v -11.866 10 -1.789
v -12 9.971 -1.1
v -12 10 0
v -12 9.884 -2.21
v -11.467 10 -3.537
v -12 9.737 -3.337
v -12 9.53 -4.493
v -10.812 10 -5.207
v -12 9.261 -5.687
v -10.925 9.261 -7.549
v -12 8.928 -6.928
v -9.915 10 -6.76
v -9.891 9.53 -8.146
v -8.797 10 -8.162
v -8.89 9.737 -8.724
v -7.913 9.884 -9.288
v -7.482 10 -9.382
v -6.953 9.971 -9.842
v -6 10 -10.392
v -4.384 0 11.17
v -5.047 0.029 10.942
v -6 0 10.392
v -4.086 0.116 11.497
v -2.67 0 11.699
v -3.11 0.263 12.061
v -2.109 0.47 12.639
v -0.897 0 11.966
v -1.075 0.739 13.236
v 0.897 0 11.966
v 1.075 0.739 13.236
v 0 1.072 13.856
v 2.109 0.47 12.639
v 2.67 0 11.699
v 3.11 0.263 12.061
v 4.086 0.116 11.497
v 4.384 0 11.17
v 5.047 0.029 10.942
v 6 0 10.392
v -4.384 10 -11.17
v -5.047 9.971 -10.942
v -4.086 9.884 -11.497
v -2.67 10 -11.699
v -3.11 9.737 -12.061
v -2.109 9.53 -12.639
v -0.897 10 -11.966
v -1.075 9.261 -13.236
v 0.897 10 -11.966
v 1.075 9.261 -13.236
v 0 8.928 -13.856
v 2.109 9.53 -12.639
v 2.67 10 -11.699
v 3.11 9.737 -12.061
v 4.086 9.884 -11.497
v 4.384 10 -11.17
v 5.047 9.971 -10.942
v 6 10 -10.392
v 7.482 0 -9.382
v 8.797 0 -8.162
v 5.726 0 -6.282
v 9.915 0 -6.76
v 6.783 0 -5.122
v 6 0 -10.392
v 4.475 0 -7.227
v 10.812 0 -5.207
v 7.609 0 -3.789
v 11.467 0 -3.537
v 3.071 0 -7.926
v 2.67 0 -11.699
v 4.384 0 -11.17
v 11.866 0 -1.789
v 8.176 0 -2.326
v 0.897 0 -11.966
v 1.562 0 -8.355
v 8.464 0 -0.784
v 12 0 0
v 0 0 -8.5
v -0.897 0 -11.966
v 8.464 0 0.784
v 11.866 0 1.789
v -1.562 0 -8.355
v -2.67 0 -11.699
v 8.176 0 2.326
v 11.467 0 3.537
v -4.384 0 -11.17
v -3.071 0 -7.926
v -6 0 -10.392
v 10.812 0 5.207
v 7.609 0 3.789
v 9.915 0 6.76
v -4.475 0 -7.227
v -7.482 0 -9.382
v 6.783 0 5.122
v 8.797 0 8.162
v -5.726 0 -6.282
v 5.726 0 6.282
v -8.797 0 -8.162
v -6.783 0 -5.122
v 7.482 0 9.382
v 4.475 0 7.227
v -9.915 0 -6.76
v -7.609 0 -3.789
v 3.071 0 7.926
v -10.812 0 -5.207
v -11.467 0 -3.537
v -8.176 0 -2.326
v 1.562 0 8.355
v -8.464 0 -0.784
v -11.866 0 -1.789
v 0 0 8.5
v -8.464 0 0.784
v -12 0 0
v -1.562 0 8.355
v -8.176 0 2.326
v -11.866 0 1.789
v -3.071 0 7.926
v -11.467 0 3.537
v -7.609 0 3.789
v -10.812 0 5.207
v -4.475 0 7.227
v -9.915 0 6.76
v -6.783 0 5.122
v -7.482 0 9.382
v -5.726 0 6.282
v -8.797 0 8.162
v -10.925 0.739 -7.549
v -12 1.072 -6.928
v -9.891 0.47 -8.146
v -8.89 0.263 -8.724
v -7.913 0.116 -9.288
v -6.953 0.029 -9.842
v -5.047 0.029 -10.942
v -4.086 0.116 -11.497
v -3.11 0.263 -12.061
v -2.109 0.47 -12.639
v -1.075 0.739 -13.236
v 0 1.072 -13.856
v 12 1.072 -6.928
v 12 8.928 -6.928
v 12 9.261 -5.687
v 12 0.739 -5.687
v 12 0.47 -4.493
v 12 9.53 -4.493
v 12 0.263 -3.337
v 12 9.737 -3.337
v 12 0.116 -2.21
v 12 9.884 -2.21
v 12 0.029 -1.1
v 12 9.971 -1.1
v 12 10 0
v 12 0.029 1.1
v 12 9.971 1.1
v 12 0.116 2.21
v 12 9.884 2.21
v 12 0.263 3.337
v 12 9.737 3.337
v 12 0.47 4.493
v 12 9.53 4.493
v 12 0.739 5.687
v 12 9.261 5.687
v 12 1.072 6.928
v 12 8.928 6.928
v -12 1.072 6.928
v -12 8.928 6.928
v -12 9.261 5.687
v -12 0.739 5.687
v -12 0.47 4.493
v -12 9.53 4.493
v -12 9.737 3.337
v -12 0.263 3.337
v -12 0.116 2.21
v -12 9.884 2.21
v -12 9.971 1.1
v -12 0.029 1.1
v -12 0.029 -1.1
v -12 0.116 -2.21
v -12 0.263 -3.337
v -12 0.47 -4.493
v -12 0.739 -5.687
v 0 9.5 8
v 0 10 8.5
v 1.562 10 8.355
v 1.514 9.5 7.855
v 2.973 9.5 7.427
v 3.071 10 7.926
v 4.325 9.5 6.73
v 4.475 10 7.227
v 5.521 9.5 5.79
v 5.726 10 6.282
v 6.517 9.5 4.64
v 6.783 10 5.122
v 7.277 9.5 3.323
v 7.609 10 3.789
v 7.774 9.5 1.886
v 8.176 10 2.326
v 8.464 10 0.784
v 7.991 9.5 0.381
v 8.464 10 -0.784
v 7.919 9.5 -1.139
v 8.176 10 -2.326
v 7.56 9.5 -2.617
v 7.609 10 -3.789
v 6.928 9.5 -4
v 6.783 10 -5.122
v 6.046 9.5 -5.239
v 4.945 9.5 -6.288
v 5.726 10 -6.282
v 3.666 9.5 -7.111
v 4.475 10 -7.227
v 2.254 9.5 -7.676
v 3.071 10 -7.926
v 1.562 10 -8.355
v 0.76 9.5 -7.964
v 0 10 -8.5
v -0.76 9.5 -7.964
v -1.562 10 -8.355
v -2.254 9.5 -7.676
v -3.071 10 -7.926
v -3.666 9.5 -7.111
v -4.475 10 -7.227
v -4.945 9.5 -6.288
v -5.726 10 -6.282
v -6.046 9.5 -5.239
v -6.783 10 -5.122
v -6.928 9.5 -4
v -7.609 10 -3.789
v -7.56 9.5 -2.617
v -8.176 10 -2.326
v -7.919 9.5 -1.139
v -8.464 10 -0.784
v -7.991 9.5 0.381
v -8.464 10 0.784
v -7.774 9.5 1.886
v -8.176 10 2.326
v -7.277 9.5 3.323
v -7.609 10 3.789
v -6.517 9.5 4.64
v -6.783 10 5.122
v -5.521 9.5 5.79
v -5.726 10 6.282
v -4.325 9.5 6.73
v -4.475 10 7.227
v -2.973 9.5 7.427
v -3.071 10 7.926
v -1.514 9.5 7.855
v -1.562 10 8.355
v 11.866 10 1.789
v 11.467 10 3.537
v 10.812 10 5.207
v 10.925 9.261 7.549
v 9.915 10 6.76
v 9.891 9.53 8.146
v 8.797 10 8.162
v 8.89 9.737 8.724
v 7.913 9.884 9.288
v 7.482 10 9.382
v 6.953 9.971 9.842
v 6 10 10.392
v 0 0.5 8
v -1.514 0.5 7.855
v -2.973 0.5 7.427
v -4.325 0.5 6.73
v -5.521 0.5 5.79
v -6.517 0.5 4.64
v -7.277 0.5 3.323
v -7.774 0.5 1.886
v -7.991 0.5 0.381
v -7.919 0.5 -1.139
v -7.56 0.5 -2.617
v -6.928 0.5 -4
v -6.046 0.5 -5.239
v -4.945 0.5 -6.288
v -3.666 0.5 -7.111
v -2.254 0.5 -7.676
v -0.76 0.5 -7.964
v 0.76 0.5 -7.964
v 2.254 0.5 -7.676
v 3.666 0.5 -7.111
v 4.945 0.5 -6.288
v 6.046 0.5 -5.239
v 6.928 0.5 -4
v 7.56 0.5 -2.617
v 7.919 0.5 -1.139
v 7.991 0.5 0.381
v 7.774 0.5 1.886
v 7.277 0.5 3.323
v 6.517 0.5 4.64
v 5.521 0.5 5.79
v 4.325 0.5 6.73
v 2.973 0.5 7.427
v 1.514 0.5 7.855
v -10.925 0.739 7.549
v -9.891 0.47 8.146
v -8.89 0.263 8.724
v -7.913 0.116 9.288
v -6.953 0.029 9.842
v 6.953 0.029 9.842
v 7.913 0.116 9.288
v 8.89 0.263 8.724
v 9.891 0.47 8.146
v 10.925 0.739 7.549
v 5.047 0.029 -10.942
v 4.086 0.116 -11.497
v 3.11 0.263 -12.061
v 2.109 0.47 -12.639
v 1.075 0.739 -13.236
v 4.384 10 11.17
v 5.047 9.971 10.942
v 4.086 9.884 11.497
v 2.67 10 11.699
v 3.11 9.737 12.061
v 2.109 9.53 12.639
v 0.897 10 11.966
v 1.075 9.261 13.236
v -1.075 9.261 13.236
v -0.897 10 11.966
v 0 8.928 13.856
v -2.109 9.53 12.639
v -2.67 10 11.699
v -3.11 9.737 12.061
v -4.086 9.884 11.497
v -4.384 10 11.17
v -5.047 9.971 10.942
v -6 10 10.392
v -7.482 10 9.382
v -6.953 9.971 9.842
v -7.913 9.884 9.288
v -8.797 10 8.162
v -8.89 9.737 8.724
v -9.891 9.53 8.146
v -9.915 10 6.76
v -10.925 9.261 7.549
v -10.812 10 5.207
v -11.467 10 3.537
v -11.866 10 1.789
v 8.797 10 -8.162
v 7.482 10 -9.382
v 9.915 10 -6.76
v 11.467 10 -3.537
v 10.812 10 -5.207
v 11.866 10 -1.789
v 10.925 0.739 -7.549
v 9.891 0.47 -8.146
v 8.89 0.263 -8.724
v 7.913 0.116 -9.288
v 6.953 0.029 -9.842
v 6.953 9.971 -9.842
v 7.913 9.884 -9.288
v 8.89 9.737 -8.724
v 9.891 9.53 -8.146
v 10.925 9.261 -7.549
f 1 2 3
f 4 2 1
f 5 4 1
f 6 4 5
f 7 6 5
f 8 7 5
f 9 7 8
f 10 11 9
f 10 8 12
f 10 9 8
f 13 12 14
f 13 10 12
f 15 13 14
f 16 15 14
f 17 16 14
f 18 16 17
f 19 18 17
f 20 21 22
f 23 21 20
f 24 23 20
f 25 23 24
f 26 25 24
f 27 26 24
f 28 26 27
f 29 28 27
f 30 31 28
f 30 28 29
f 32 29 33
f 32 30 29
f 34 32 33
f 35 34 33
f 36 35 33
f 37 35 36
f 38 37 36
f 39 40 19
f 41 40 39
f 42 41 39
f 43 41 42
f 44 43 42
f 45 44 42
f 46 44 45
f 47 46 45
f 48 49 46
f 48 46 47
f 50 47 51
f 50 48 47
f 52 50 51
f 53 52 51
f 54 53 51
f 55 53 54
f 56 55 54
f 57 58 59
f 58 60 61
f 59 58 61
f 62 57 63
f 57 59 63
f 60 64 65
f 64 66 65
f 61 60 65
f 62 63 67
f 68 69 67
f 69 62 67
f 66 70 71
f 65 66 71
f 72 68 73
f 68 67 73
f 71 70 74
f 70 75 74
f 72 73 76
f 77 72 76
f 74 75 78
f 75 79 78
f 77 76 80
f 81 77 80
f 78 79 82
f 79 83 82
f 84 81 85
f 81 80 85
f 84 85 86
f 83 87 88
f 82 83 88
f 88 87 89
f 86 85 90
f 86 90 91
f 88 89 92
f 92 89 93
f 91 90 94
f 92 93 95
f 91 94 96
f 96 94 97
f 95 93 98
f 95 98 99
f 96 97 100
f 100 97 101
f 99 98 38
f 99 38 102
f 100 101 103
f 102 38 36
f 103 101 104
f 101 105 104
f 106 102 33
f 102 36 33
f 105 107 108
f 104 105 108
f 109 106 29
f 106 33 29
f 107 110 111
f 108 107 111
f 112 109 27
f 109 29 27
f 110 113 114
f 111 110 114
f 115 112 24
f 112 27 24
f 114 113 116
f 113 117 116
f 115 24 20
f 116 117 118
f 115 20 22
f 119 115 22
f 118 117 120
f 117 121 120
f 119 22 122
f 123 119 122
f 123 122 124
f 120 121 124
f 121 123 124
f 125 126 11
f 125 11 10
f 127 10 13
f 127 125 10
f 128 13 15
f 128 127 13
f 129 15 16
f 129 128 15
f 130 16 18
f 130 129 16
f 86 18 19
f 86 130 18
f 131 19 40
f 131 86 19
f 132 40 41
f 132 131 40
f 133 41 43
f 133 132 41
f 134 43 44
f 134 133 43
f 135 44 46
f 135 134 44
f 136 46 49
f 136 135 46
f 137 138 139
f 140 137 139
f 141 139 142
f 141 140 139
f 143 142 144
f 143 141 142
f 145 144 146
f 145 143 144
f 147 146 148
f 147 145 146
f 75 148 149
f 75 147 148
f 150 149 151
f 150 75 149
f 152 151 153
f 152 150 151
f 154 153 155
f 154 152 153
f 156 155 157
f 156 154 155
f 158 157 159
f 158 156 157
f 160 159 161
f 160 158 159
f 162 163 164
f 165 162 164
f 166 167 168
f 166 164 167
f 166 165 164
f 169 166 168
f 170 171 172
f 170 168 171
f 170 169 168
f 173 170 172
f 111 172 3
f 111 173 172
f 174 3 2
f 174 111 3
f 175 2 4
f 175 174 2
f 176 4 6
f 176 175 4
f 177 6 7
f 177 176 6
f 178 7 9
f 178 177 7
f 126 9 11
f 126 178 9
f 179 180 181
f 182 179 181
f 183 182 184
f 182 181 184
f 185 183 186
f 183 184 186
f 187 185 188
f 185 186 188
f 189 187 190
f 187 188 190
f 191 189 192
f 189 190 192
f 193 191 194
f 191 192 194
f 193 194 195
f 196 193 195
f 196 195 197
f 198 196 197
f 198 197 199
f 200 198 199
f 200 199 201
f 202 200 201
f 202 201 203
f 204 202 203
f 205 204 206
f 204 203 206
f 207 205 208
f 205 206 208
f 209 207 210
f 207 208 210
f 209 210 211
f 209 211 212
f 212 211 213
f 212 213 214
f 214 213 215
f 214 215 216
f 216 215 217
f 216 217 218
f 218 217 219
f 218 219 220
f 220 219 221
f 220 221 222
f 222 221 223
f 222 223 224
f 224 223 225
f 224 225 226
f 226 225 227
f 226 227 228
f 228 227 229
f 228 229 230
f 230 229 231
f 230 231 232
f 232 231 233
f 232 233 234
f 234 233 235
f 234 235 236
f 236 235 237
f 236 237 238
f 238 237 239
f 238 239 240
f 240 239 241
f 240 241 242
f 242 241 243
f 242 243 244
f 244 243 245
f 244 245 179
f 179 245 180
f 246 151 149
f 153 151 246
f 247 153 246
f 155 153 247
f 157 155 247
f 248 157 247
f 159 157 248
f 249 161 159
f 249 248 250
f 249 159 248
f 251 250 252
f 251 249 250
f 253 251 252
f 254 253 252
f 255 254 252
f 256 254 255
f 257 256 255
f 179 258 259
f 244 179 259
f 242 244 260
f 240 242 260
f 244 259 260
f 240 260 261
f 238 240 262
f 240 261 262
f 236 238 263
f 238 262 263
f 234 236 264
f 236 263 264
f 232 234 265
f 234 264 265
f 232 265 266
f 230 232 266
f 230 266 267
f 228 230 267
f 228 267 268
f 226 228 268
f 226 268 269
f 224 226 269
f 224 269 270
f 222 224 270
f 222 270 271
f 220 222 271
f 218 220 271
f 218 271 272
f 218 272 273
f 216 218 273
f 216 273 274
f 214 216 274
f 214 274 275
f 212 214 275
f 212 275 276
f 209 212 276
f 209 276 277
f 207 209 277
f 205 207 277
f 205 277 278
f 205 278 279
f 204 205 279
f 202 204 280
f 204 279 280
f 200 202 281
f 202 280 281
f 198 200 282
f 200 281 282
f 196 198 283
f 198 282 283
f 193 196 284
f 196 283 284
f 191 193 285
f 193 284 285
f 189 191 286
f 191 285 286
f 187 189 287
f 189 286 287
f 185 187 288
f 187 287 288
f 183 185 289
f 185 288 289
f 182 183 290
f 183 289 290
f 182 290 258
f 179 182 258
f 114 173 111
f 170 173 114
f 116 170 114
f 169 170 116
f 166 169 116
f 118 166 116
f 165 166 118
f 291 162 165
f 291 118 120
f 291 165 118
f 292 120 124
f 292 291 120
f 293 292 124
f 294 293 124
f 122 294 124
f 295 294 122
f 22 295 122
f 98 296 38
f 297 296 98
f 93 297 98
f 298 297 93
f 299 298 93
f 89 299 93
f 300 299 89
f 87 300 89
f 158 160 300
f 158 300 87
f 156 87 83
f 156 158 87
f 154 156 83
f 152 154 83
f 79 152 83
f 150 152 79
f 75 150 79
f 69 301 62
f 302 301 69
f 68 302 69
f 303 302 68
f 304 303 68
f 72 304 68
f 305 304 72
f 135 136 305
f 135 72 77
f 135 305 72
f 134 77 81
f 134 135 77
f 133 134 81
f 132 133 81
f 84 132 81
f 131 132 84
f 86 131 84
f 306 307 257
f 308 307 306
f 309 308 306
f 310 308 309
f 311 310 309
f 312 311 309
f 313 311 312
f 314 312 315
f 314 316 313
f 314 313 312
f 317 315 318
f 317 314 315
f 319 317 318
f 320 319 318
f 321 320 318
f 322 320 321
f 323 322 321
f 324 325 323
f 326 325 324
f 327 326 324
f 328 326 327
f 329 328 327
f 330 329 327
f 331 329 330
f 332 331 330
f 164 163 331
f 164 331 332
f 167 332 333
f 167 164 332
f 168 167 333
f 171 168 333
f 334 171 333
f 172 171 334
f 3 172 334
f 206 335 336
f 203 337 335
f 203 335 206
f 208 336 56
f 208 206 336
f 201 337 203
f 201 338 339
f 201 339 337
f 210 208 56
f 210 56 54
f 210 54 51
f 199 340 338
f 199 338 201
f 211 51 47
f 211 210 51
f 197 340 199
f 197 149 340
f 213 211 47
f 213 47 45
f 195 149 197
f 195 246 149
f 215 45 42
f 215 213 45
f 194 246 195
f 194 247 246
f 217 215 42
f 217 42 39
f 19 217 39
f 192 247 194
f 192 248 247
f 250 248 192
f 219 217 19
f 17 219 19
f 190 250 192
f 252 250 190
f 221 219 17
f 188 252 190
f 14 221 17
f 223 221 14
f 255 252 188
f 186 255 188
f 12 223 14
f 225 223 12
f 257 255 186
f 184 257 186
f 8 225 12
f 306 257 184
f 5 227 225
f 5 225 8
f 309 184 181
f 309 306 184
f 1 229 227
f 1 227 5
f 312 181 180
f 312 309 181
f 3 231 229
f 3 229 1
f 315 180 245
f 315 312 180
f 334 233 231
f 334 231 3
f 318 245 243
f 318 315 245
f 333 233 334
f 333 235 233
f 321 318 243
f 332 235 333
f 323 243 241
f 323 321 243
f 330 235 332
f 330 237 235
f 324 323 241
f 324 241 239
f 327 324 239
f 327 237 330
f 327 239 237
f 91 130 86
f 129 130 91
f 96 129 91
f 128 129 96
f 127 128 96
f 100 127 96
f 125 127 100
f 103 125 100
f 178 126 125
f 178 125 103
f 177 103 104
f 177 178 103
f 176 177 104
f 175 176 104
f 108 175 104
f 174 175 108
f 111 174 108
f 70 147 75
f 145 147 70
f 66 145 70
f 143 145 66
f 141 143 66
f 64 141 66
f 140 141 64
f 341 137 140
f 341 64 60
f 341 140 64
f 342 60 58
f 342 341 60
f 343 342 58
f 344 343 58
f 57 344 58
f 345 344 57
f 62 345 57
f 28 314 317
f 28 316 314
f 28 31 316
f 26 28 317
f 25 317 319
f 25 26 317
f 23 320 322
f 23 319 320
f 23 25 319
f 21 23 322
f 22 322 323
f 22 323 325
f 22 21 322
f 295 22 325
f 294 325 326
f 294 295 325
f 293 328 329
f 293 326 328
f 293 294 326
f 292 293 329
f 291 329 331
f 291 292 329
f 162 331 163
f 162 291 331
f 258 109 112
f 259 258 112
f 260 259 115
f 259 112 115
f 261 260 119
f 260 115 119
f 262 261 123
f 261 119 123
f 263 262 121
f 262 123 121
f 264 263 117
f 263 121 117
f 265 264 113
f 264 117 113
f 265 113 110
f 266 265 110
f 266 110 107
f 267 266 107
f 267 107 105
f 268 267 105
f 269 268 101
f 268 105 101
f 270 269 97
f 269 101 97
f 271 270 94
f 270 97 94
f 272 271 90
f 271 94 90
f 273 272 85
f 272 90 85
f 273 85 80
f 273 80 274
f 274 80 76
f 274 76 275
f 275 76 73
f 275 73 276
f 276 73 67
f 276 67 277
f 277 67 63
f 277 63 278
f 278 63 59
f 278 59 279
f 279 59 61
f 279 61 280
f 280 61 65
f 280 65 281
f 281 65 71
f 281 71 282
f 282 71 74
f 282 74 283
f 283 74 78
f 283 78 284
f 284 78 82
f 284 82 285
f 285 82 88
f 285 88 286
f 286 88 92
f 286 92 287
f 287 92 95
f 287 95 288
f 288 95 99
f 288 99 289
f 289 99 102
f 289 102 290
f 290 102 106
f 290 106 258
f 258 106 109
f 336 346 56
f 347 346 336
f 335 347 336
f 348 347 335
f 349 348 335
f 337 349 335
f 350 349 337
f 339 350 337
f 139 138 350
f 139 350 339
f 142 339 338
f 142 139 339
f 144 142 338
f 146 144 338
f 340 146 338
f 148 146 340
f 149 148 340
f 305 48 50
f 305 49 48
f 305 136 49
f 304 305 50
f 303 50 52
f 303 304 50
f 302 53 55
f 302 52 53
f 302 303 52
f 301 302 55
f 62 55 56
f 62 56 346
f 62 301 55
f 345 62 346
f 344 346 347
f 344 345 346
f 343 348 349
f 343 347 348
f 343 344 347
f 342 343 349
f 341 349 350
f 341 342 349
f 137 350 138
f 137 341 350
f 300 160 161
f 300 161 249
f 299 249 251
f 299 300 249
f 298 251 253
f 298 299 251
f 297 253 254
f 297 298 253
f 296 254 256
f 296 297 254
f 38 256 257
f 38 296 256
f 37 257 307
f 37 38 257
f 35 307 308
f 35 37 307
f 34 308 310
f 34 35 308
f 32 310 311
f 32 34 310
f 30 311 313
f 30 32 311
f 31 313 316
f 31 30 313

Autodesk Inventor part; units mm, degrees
ref_plane "YZ Plane" through (0, 0, 0) normal (1, 0, 0) x (0, 1, 0)
ref_plane "XZ Plane" through (0, 0, 0) normal (0, 1, 0) x (-1, 0, 0)
ref_plane "XY Plane" through (0, 0, 0) normal (0, 0, 1) x (1, 0, 0)
sketch "Sketch1" plane through (0, 0, 0) normal (0, 1, 0) x (-1, 0, 0)
  line L0 (12, -6.9282) -> (0, -13.8564)
  line L1 (0, -13.8564) -> (-12, -6.9282)
  line L2 (-12, -6.9282) -> (-12, 6.9282)
  line L3 (-12, 6.9282) -> (0, 13.8564)
  line L4 (0, 13.8564) -> (12, 6.9282)
  line L5 (12, 6.9282) -> (12, -6.9282)
  point P0 (0, 0)
  point P1 (0, 0)
  point P2 (-12, 0)
  point P3 (12, 0)
  dimension "d0" = 24
extrude "Extrusion1" add sketch "Sketch1" along normal blind 10
sketch "Sketch2" plane through (0, 10, 0) normal (0, 1, 0) x (1, 0, 0)
  circle A0 centre (0, 0) radius 12
extrude "Extrusion2" cut sketch "Sketch2" against normal blind 10 draft 60 keep common part
sketch "Sketch4" plane through (0, 0, 0) normal (0, -1, 0) x (1, 0, 0)
  circle A0 centre (0, 0) radius 12
extrude "Extrusion4" cut sketch "Sketch4" against normal blind 60 draft 60 keep common part
sketch "Sketch5" plane through (0, 10, 0) normal (0, 1, 0) x (1, 0, 0)
  point P0 (0, 0)
  point P1 (0, 0)
hole "Hole1" at (0, 10, 0) direction (0, -1, 0) diameter 16 end through all
thread "Thread2" size "M16x2" class "6H" standard "ANSI Metric M Profile" length 38
chamfer "Chamfer2" distance 0.5 angle 45 2 edges at (0, 10, -8) (0, 0, -8)
properties part number "csavar" material "Steel, Alloy"
